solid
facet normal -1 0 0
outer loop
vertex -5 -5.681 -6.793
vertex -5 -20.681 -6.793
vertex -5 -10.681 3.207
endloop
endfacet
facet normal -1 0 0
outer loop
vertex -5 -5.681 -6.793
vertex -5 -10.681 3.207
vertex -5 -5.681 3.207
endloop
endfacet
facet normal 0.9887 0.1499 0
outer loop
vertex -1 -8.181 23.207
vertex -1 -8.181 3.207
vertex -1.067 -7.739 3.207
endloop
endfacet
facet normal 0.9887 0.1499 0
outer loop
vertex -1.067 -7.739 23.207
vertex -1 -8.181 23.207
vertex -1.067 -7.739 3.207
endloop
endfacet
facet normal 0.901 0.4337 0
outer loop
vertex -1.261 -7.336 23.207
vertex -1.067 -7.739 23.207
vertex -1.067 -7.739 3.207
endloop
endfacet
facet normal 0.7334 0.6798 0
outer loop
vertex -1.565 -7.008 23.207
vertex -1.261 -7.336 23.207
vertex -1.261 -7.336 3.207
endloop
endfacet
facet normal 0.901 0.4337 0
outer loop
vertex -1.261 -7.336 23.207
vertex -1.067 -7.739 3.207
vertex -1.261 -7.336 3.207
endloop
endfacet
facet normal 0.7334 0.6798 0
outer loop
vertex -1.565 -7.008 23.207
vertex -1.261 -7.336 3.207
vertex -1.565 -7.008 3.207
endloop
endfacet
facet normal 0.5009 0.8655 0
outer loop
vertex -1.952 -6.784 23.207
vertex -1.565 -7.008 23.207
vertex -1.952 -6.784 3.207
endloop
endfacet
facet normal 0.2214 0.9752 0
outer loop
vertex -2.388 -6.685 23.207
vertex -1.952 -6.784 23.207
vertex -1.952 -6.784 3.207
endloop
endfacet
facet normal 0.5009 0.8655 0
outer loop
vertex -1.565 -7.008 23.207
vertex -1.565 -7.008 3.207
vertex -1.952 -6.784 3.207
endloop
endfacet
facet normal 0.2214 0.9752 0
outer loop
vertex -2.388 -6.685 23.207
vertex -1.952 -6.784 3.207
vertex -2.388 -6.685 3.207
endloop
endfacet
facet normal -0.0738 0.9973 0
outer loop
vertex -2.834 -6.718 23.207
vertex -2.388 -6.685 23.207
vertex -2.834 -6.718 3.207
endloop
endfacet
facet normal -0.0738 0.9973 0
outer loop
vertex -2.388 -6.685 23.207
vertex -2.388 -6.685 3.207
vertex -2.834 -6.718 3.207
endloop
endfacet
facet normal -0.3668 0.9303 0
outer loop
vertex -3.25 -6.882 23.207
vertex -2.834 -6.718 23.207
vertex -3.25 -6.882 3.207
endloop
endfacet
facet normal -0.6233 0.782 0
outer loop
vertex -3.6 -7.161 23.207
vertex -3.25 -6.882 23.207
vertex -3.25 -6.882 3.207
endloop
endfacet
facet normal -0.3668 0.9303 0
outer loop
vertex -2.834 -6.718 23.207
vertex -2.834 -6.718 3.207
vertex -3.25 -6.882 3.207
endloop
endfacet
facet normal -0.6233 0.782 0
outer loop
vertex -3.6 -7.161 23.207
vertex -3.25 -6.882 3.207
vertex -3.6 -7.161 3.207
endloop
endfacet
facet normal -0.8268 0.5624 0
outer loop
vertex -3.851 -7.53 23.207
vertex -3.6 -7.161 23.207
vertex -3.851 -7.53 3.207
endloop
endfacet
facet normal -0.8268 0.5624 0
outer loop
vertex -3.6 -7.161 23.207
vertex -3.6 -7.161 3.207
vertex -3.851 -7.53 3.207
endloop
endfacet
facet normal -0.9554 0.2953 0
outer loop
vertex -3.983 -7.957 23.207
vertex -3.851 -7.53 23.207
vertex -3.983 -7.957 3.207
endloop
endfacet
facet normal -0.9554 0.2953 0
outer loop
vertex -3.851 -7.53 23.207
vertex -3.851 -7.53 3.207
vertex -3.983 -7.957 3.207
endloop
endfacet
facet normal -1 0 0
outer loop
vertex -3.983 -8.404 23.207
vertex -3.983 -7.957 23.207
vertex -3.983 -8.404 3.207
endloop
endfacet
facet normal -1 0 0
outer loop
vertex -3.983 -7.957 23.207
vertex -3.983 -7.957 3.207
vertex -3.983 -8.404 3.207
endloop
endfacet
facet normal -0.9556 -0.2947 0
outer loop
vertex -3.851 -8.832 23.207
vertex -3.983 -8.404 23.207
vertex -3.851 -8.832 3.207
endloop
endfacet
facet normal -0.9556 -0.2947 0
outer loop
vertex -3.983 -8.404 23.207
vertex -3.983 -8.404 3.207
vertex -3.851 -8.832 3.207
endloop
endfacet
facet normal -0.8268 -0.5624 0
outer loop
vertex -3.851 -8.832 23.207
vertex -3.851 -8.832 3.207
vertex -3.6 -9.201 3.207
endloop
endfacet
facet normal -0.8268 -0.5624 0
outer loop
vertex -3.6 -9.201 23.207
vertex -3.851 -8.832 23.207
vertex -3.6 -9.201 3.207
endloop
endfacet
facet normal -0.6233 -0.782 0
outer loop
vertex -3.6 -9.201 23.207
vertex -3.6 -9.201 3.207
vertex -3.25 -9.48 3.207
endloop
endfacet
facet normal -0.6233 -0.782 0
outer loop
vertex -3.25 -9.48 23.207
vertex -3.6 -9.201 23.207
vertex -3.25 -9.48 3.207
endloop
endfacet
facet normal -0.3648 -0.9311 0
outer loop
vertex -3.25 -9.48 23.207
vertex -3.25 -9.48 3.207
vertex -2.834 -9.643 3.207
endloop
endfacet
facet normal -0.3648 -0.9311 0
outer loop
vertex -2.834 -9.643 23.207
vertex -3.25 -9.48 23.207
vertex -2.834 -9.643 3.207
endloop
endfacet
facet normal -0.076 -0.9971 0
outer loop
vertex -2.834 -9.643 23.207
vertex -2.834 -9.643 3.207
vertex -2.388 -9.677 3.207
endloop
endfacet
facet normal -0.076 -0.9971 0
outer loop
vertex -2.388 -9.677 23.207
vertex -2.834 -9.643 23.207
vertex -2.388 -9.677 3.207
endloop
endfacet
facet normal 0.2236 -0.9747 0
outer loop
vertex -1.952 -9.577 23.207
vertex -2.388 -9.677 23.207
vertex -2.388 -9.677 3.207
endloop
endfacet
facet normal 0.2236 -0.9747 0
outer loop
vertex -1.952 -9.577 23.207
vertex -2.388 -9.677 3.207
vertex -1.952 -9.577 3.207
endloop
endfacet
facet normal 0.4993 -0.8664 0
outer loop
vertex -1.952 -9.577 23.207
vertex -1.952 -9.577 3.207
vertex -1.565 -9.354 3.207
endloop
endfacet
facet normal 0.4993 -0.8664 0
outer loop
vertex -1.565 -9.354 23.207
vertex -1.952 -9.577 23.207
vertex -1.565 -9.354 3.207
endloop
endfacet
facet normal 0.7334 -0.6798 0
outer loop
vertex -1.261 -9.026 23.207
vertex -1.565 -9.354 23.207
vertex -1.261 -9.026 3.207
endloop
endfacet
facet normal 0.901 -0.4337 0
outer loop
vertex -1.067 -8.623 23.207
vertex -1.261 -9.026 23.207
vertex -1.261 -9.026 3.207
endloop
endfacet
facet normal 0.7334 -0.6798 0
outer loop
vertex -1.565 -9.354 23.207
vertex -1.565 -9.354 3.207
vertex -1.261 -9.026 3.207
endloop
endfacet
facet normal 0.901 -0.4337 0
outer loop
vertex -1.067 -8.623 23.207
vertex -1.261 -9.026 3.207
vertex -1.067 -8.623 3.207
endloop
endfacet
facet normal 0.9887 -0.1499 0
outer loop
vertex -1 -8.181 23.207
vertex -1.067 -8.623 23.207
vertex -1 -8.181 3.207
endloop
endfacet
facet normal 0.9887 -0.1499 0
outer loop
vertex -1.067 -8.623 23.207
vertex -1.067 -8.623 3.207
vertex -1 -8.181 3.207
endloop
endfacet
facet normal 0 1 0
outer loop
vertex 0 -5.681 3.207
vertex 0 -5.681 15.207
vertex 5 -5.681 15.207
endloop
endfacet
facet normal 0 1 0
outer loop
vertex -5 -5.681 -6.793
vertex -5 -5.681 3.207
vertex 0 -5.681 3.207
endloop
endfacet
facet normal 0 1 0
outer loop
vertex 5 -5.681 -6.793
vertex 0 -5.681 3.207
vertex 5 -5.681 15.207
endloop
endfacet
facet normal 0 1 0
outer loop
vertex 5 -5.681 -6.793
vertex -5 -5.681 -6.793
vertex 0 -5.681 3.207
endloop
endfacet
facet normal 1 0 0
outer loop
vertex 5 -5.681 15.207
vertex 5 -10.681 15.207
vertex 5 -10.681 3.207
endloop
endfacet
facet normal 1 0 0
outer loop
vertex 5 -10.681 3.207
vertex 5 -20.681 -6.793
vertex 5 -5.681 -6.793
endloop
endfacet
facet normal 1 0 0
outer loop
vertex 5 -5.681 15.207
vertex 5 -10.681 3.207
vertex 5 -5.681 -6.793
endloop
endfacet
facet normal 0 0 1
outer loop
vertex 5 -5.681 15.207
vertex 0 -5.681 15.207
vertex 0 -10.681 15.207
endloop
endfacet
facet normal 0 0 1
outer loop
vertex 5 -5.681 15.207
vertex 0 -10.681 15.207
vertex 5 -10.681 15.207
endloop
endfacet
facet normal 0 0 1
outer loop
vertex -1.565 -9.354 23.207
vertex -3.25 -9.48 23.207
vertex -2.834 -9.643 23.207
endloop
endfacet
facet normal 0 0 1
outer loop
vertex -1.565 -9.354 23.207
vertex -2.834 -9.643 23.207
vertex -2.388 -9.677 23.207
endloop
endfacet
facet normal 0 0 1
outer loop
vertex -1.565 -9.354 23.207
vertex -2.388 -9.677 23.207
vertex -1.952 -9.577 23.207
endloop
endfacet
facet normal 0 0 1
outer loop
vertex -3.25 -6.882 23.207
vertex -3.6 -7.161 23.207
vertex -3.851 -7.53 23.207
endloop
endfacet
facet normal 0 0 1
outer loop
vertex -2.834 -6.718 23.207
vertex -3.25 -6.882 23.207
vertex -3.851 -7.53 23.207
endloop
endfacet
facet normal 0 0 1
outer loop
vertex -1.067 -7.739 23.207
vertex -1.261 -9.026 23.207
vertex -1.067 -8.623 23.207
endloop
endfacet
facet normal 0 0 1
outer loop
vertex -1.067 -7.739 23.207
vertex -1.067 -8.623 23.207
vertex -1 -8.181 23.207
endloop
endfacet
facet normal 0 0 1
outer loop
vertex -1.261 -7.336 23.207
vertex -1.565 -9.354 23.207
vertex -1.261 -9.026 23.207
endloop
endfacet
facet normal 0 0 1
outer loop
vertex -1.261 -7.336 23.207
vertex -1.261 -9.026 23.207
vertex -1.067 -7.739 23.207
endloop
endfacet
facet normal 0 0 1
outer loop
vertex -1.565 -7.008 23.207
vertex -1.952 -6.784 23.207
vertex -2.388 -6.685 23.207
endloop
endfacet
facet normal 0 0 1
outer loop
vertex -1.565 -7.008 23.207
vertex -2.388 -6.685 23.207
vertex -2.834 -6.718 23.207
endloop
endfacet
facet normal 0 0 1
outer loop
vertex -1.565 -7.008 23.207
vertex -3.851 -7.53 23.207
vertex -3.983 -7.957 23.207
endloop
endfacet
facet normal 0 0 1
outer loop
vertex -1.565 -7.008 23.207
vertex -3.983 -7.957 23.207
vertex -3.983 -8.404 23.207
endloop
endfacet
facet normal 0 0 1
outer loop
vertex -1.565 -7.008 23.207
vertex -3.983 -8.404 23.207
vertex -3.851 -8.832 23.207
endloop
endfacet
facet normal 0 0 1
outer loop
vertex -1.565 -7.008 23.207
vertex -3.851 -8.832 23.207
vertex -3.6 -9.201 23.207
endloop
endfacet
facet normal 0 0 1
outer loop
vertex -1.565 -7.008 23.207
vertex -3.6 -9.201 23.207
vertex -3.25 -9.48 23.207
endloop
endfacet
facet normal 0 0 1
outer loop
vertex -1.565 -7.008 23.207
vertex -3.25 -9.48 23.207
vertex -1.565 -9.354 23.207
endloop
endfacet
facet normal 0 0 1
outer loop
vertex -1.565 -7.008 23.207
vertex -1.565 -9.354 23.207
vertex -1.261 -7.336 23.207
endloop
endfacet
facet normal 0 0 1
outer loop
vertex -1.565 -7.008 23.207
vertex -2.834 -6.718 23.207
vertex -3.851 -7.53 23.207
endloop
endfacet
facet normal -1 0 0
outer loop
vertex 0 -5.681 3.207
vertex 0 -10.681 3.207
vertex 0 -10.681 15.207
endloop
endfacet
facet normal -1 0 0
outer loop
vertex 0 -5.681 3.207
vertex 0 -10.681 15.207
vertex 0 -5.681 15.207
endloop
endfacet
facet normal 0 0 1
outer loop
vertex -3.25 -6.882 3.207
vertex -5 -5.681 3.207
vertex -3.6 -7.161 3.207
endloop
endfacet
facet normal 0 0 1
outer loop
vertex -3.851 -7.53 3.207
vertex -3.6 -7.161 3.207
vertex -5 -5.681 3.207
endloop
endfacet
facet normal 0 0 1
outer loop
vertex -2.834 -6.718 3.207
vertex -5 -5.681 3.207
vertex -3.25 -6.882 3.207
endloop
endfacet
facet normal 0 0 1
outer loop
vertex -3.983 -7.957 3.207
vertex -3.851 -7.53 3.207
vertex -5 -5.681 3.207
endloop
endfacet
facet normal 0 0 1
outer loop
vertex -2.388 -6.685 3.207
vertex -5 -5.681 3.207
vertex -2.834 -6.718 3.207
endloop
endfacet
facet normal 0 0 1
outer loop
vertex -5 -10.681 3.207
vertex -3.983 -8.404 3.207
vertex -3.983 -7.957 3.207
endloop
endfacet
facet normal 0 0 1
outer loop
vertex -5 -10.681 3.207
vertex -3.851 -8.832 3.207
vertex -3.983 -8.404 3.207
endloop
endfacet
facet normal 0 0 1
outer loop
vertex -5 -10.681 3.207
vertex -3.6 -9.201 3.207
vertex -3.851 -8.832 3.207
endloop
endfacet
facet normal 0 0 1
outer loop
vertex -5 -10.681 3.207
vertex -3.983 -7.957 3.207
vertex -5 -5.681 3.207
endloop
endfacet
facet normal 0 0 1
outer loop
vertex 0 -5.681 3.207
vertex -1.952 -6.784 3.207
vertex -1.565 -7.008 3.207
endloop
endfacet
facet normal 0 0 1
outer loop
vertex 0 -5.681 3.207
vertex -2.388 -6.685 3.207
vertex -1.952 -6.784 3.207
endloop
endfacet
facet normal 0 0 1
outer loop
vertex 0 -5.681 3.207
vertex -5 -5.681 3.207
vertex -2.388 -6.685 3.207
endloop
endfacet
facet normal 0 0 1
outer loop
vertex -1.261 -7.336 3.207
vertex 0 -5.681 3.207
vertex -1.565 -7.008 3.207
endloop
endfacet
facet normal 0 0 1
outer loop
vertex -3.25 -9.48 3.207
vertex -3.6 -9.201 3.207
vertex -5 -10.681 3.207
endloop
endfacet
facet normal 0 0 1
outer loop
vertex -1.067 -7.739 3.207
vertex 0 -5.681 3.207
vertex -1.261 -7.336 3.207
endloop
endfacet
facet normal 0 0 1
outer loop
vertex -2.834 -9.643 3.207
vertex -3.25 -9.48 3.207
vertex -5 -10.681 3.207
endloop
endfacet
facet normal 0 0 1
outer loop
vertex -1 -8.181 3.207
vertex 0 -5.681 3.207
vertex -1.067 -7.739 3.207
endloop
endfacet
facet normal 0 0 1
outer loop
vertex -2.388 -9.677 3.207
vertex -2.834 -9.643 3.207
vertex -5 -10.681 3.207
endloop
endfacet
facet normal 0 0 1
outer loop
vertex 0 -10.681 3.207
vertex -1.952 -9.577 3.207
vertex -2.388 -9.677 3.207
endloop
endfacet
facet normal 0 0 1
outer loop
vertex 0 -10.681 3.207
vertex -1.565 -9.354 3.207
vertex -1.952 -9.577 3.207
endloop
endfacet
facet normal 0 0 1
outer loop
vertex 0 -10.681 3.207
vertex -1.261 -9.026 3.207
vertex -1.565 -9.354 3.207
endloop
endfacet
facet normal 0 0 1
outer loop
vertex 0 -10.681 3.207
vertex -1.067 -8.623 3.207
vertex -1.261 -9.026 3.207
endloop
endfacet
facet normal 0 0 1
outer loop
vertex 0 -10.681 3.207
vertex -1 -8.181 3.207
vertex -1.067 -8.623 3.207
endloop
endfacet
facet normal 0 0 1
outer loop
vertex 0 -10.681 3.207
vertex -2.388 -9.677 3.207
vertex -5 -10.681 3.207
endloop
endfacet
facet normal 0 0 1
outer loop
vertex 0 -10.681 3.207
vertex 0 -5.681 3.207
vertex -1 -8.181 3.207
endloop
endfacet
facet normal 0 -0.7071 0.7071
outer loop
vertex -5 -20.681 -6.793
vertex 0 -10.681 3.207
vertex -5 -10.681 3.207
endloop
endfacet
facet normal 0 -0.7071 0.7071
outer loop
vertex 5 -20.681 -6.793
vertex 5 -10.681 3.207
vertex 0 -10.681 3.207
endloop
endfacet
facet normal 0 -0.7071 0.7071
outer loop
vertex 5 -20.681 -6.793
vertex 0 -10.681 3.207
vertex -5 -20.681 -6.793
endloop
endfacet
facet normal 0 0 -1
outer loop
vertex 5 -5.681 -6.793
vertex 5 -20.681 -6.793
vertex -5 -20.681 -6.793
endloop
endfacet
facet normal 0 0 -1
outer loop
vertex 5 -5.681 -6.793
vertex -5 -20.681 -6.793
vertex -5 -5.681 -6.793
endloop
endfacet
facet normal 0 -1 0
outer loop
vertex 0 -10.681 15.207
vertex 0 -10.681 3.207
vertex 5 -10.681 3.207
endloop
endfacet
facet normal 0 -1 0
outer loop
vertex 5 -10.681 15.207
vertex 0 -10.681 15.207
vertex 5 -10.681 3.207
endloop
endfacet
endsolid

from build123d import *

# Parameters (mm, degrees)
F1_DEPTH = 5
F2_W     = 5
F2_H     = 5
F3_DEPTH = 12
F4_R     = 1.5
F5_DEPTH = 20


with BuildPart() as f1:
    # F0 (on Right) → F1 (new body, symmetric)
    with BuildSketch(Plane.YZ):
        Polygon((-5.680779, 3.206832), (-10.680779, 3.206832), (-20.680779, -6.793168), (-5.680779, -6.793168), align=None)
    extrude(amount=F1_DEPTH, both=True)

    # F2 (on face) → F3 (join)
    with BuildSketch(Plane.XY.offset(3.206832)):
        with Locations((2.5, -8.180779)):
            Rectangle(F2_W, F2_H)
    extrude(amount=F3_DEPTH)

    # F4 (on face) → F5 (join)
    with BuildSketch(Plane.XY.offset(3.206832)):
        with Locations((-2.5, -8.180779)):
            Circle(F4_R)
    extrude(amount=F5_DEPTH)


solid = f1.part
